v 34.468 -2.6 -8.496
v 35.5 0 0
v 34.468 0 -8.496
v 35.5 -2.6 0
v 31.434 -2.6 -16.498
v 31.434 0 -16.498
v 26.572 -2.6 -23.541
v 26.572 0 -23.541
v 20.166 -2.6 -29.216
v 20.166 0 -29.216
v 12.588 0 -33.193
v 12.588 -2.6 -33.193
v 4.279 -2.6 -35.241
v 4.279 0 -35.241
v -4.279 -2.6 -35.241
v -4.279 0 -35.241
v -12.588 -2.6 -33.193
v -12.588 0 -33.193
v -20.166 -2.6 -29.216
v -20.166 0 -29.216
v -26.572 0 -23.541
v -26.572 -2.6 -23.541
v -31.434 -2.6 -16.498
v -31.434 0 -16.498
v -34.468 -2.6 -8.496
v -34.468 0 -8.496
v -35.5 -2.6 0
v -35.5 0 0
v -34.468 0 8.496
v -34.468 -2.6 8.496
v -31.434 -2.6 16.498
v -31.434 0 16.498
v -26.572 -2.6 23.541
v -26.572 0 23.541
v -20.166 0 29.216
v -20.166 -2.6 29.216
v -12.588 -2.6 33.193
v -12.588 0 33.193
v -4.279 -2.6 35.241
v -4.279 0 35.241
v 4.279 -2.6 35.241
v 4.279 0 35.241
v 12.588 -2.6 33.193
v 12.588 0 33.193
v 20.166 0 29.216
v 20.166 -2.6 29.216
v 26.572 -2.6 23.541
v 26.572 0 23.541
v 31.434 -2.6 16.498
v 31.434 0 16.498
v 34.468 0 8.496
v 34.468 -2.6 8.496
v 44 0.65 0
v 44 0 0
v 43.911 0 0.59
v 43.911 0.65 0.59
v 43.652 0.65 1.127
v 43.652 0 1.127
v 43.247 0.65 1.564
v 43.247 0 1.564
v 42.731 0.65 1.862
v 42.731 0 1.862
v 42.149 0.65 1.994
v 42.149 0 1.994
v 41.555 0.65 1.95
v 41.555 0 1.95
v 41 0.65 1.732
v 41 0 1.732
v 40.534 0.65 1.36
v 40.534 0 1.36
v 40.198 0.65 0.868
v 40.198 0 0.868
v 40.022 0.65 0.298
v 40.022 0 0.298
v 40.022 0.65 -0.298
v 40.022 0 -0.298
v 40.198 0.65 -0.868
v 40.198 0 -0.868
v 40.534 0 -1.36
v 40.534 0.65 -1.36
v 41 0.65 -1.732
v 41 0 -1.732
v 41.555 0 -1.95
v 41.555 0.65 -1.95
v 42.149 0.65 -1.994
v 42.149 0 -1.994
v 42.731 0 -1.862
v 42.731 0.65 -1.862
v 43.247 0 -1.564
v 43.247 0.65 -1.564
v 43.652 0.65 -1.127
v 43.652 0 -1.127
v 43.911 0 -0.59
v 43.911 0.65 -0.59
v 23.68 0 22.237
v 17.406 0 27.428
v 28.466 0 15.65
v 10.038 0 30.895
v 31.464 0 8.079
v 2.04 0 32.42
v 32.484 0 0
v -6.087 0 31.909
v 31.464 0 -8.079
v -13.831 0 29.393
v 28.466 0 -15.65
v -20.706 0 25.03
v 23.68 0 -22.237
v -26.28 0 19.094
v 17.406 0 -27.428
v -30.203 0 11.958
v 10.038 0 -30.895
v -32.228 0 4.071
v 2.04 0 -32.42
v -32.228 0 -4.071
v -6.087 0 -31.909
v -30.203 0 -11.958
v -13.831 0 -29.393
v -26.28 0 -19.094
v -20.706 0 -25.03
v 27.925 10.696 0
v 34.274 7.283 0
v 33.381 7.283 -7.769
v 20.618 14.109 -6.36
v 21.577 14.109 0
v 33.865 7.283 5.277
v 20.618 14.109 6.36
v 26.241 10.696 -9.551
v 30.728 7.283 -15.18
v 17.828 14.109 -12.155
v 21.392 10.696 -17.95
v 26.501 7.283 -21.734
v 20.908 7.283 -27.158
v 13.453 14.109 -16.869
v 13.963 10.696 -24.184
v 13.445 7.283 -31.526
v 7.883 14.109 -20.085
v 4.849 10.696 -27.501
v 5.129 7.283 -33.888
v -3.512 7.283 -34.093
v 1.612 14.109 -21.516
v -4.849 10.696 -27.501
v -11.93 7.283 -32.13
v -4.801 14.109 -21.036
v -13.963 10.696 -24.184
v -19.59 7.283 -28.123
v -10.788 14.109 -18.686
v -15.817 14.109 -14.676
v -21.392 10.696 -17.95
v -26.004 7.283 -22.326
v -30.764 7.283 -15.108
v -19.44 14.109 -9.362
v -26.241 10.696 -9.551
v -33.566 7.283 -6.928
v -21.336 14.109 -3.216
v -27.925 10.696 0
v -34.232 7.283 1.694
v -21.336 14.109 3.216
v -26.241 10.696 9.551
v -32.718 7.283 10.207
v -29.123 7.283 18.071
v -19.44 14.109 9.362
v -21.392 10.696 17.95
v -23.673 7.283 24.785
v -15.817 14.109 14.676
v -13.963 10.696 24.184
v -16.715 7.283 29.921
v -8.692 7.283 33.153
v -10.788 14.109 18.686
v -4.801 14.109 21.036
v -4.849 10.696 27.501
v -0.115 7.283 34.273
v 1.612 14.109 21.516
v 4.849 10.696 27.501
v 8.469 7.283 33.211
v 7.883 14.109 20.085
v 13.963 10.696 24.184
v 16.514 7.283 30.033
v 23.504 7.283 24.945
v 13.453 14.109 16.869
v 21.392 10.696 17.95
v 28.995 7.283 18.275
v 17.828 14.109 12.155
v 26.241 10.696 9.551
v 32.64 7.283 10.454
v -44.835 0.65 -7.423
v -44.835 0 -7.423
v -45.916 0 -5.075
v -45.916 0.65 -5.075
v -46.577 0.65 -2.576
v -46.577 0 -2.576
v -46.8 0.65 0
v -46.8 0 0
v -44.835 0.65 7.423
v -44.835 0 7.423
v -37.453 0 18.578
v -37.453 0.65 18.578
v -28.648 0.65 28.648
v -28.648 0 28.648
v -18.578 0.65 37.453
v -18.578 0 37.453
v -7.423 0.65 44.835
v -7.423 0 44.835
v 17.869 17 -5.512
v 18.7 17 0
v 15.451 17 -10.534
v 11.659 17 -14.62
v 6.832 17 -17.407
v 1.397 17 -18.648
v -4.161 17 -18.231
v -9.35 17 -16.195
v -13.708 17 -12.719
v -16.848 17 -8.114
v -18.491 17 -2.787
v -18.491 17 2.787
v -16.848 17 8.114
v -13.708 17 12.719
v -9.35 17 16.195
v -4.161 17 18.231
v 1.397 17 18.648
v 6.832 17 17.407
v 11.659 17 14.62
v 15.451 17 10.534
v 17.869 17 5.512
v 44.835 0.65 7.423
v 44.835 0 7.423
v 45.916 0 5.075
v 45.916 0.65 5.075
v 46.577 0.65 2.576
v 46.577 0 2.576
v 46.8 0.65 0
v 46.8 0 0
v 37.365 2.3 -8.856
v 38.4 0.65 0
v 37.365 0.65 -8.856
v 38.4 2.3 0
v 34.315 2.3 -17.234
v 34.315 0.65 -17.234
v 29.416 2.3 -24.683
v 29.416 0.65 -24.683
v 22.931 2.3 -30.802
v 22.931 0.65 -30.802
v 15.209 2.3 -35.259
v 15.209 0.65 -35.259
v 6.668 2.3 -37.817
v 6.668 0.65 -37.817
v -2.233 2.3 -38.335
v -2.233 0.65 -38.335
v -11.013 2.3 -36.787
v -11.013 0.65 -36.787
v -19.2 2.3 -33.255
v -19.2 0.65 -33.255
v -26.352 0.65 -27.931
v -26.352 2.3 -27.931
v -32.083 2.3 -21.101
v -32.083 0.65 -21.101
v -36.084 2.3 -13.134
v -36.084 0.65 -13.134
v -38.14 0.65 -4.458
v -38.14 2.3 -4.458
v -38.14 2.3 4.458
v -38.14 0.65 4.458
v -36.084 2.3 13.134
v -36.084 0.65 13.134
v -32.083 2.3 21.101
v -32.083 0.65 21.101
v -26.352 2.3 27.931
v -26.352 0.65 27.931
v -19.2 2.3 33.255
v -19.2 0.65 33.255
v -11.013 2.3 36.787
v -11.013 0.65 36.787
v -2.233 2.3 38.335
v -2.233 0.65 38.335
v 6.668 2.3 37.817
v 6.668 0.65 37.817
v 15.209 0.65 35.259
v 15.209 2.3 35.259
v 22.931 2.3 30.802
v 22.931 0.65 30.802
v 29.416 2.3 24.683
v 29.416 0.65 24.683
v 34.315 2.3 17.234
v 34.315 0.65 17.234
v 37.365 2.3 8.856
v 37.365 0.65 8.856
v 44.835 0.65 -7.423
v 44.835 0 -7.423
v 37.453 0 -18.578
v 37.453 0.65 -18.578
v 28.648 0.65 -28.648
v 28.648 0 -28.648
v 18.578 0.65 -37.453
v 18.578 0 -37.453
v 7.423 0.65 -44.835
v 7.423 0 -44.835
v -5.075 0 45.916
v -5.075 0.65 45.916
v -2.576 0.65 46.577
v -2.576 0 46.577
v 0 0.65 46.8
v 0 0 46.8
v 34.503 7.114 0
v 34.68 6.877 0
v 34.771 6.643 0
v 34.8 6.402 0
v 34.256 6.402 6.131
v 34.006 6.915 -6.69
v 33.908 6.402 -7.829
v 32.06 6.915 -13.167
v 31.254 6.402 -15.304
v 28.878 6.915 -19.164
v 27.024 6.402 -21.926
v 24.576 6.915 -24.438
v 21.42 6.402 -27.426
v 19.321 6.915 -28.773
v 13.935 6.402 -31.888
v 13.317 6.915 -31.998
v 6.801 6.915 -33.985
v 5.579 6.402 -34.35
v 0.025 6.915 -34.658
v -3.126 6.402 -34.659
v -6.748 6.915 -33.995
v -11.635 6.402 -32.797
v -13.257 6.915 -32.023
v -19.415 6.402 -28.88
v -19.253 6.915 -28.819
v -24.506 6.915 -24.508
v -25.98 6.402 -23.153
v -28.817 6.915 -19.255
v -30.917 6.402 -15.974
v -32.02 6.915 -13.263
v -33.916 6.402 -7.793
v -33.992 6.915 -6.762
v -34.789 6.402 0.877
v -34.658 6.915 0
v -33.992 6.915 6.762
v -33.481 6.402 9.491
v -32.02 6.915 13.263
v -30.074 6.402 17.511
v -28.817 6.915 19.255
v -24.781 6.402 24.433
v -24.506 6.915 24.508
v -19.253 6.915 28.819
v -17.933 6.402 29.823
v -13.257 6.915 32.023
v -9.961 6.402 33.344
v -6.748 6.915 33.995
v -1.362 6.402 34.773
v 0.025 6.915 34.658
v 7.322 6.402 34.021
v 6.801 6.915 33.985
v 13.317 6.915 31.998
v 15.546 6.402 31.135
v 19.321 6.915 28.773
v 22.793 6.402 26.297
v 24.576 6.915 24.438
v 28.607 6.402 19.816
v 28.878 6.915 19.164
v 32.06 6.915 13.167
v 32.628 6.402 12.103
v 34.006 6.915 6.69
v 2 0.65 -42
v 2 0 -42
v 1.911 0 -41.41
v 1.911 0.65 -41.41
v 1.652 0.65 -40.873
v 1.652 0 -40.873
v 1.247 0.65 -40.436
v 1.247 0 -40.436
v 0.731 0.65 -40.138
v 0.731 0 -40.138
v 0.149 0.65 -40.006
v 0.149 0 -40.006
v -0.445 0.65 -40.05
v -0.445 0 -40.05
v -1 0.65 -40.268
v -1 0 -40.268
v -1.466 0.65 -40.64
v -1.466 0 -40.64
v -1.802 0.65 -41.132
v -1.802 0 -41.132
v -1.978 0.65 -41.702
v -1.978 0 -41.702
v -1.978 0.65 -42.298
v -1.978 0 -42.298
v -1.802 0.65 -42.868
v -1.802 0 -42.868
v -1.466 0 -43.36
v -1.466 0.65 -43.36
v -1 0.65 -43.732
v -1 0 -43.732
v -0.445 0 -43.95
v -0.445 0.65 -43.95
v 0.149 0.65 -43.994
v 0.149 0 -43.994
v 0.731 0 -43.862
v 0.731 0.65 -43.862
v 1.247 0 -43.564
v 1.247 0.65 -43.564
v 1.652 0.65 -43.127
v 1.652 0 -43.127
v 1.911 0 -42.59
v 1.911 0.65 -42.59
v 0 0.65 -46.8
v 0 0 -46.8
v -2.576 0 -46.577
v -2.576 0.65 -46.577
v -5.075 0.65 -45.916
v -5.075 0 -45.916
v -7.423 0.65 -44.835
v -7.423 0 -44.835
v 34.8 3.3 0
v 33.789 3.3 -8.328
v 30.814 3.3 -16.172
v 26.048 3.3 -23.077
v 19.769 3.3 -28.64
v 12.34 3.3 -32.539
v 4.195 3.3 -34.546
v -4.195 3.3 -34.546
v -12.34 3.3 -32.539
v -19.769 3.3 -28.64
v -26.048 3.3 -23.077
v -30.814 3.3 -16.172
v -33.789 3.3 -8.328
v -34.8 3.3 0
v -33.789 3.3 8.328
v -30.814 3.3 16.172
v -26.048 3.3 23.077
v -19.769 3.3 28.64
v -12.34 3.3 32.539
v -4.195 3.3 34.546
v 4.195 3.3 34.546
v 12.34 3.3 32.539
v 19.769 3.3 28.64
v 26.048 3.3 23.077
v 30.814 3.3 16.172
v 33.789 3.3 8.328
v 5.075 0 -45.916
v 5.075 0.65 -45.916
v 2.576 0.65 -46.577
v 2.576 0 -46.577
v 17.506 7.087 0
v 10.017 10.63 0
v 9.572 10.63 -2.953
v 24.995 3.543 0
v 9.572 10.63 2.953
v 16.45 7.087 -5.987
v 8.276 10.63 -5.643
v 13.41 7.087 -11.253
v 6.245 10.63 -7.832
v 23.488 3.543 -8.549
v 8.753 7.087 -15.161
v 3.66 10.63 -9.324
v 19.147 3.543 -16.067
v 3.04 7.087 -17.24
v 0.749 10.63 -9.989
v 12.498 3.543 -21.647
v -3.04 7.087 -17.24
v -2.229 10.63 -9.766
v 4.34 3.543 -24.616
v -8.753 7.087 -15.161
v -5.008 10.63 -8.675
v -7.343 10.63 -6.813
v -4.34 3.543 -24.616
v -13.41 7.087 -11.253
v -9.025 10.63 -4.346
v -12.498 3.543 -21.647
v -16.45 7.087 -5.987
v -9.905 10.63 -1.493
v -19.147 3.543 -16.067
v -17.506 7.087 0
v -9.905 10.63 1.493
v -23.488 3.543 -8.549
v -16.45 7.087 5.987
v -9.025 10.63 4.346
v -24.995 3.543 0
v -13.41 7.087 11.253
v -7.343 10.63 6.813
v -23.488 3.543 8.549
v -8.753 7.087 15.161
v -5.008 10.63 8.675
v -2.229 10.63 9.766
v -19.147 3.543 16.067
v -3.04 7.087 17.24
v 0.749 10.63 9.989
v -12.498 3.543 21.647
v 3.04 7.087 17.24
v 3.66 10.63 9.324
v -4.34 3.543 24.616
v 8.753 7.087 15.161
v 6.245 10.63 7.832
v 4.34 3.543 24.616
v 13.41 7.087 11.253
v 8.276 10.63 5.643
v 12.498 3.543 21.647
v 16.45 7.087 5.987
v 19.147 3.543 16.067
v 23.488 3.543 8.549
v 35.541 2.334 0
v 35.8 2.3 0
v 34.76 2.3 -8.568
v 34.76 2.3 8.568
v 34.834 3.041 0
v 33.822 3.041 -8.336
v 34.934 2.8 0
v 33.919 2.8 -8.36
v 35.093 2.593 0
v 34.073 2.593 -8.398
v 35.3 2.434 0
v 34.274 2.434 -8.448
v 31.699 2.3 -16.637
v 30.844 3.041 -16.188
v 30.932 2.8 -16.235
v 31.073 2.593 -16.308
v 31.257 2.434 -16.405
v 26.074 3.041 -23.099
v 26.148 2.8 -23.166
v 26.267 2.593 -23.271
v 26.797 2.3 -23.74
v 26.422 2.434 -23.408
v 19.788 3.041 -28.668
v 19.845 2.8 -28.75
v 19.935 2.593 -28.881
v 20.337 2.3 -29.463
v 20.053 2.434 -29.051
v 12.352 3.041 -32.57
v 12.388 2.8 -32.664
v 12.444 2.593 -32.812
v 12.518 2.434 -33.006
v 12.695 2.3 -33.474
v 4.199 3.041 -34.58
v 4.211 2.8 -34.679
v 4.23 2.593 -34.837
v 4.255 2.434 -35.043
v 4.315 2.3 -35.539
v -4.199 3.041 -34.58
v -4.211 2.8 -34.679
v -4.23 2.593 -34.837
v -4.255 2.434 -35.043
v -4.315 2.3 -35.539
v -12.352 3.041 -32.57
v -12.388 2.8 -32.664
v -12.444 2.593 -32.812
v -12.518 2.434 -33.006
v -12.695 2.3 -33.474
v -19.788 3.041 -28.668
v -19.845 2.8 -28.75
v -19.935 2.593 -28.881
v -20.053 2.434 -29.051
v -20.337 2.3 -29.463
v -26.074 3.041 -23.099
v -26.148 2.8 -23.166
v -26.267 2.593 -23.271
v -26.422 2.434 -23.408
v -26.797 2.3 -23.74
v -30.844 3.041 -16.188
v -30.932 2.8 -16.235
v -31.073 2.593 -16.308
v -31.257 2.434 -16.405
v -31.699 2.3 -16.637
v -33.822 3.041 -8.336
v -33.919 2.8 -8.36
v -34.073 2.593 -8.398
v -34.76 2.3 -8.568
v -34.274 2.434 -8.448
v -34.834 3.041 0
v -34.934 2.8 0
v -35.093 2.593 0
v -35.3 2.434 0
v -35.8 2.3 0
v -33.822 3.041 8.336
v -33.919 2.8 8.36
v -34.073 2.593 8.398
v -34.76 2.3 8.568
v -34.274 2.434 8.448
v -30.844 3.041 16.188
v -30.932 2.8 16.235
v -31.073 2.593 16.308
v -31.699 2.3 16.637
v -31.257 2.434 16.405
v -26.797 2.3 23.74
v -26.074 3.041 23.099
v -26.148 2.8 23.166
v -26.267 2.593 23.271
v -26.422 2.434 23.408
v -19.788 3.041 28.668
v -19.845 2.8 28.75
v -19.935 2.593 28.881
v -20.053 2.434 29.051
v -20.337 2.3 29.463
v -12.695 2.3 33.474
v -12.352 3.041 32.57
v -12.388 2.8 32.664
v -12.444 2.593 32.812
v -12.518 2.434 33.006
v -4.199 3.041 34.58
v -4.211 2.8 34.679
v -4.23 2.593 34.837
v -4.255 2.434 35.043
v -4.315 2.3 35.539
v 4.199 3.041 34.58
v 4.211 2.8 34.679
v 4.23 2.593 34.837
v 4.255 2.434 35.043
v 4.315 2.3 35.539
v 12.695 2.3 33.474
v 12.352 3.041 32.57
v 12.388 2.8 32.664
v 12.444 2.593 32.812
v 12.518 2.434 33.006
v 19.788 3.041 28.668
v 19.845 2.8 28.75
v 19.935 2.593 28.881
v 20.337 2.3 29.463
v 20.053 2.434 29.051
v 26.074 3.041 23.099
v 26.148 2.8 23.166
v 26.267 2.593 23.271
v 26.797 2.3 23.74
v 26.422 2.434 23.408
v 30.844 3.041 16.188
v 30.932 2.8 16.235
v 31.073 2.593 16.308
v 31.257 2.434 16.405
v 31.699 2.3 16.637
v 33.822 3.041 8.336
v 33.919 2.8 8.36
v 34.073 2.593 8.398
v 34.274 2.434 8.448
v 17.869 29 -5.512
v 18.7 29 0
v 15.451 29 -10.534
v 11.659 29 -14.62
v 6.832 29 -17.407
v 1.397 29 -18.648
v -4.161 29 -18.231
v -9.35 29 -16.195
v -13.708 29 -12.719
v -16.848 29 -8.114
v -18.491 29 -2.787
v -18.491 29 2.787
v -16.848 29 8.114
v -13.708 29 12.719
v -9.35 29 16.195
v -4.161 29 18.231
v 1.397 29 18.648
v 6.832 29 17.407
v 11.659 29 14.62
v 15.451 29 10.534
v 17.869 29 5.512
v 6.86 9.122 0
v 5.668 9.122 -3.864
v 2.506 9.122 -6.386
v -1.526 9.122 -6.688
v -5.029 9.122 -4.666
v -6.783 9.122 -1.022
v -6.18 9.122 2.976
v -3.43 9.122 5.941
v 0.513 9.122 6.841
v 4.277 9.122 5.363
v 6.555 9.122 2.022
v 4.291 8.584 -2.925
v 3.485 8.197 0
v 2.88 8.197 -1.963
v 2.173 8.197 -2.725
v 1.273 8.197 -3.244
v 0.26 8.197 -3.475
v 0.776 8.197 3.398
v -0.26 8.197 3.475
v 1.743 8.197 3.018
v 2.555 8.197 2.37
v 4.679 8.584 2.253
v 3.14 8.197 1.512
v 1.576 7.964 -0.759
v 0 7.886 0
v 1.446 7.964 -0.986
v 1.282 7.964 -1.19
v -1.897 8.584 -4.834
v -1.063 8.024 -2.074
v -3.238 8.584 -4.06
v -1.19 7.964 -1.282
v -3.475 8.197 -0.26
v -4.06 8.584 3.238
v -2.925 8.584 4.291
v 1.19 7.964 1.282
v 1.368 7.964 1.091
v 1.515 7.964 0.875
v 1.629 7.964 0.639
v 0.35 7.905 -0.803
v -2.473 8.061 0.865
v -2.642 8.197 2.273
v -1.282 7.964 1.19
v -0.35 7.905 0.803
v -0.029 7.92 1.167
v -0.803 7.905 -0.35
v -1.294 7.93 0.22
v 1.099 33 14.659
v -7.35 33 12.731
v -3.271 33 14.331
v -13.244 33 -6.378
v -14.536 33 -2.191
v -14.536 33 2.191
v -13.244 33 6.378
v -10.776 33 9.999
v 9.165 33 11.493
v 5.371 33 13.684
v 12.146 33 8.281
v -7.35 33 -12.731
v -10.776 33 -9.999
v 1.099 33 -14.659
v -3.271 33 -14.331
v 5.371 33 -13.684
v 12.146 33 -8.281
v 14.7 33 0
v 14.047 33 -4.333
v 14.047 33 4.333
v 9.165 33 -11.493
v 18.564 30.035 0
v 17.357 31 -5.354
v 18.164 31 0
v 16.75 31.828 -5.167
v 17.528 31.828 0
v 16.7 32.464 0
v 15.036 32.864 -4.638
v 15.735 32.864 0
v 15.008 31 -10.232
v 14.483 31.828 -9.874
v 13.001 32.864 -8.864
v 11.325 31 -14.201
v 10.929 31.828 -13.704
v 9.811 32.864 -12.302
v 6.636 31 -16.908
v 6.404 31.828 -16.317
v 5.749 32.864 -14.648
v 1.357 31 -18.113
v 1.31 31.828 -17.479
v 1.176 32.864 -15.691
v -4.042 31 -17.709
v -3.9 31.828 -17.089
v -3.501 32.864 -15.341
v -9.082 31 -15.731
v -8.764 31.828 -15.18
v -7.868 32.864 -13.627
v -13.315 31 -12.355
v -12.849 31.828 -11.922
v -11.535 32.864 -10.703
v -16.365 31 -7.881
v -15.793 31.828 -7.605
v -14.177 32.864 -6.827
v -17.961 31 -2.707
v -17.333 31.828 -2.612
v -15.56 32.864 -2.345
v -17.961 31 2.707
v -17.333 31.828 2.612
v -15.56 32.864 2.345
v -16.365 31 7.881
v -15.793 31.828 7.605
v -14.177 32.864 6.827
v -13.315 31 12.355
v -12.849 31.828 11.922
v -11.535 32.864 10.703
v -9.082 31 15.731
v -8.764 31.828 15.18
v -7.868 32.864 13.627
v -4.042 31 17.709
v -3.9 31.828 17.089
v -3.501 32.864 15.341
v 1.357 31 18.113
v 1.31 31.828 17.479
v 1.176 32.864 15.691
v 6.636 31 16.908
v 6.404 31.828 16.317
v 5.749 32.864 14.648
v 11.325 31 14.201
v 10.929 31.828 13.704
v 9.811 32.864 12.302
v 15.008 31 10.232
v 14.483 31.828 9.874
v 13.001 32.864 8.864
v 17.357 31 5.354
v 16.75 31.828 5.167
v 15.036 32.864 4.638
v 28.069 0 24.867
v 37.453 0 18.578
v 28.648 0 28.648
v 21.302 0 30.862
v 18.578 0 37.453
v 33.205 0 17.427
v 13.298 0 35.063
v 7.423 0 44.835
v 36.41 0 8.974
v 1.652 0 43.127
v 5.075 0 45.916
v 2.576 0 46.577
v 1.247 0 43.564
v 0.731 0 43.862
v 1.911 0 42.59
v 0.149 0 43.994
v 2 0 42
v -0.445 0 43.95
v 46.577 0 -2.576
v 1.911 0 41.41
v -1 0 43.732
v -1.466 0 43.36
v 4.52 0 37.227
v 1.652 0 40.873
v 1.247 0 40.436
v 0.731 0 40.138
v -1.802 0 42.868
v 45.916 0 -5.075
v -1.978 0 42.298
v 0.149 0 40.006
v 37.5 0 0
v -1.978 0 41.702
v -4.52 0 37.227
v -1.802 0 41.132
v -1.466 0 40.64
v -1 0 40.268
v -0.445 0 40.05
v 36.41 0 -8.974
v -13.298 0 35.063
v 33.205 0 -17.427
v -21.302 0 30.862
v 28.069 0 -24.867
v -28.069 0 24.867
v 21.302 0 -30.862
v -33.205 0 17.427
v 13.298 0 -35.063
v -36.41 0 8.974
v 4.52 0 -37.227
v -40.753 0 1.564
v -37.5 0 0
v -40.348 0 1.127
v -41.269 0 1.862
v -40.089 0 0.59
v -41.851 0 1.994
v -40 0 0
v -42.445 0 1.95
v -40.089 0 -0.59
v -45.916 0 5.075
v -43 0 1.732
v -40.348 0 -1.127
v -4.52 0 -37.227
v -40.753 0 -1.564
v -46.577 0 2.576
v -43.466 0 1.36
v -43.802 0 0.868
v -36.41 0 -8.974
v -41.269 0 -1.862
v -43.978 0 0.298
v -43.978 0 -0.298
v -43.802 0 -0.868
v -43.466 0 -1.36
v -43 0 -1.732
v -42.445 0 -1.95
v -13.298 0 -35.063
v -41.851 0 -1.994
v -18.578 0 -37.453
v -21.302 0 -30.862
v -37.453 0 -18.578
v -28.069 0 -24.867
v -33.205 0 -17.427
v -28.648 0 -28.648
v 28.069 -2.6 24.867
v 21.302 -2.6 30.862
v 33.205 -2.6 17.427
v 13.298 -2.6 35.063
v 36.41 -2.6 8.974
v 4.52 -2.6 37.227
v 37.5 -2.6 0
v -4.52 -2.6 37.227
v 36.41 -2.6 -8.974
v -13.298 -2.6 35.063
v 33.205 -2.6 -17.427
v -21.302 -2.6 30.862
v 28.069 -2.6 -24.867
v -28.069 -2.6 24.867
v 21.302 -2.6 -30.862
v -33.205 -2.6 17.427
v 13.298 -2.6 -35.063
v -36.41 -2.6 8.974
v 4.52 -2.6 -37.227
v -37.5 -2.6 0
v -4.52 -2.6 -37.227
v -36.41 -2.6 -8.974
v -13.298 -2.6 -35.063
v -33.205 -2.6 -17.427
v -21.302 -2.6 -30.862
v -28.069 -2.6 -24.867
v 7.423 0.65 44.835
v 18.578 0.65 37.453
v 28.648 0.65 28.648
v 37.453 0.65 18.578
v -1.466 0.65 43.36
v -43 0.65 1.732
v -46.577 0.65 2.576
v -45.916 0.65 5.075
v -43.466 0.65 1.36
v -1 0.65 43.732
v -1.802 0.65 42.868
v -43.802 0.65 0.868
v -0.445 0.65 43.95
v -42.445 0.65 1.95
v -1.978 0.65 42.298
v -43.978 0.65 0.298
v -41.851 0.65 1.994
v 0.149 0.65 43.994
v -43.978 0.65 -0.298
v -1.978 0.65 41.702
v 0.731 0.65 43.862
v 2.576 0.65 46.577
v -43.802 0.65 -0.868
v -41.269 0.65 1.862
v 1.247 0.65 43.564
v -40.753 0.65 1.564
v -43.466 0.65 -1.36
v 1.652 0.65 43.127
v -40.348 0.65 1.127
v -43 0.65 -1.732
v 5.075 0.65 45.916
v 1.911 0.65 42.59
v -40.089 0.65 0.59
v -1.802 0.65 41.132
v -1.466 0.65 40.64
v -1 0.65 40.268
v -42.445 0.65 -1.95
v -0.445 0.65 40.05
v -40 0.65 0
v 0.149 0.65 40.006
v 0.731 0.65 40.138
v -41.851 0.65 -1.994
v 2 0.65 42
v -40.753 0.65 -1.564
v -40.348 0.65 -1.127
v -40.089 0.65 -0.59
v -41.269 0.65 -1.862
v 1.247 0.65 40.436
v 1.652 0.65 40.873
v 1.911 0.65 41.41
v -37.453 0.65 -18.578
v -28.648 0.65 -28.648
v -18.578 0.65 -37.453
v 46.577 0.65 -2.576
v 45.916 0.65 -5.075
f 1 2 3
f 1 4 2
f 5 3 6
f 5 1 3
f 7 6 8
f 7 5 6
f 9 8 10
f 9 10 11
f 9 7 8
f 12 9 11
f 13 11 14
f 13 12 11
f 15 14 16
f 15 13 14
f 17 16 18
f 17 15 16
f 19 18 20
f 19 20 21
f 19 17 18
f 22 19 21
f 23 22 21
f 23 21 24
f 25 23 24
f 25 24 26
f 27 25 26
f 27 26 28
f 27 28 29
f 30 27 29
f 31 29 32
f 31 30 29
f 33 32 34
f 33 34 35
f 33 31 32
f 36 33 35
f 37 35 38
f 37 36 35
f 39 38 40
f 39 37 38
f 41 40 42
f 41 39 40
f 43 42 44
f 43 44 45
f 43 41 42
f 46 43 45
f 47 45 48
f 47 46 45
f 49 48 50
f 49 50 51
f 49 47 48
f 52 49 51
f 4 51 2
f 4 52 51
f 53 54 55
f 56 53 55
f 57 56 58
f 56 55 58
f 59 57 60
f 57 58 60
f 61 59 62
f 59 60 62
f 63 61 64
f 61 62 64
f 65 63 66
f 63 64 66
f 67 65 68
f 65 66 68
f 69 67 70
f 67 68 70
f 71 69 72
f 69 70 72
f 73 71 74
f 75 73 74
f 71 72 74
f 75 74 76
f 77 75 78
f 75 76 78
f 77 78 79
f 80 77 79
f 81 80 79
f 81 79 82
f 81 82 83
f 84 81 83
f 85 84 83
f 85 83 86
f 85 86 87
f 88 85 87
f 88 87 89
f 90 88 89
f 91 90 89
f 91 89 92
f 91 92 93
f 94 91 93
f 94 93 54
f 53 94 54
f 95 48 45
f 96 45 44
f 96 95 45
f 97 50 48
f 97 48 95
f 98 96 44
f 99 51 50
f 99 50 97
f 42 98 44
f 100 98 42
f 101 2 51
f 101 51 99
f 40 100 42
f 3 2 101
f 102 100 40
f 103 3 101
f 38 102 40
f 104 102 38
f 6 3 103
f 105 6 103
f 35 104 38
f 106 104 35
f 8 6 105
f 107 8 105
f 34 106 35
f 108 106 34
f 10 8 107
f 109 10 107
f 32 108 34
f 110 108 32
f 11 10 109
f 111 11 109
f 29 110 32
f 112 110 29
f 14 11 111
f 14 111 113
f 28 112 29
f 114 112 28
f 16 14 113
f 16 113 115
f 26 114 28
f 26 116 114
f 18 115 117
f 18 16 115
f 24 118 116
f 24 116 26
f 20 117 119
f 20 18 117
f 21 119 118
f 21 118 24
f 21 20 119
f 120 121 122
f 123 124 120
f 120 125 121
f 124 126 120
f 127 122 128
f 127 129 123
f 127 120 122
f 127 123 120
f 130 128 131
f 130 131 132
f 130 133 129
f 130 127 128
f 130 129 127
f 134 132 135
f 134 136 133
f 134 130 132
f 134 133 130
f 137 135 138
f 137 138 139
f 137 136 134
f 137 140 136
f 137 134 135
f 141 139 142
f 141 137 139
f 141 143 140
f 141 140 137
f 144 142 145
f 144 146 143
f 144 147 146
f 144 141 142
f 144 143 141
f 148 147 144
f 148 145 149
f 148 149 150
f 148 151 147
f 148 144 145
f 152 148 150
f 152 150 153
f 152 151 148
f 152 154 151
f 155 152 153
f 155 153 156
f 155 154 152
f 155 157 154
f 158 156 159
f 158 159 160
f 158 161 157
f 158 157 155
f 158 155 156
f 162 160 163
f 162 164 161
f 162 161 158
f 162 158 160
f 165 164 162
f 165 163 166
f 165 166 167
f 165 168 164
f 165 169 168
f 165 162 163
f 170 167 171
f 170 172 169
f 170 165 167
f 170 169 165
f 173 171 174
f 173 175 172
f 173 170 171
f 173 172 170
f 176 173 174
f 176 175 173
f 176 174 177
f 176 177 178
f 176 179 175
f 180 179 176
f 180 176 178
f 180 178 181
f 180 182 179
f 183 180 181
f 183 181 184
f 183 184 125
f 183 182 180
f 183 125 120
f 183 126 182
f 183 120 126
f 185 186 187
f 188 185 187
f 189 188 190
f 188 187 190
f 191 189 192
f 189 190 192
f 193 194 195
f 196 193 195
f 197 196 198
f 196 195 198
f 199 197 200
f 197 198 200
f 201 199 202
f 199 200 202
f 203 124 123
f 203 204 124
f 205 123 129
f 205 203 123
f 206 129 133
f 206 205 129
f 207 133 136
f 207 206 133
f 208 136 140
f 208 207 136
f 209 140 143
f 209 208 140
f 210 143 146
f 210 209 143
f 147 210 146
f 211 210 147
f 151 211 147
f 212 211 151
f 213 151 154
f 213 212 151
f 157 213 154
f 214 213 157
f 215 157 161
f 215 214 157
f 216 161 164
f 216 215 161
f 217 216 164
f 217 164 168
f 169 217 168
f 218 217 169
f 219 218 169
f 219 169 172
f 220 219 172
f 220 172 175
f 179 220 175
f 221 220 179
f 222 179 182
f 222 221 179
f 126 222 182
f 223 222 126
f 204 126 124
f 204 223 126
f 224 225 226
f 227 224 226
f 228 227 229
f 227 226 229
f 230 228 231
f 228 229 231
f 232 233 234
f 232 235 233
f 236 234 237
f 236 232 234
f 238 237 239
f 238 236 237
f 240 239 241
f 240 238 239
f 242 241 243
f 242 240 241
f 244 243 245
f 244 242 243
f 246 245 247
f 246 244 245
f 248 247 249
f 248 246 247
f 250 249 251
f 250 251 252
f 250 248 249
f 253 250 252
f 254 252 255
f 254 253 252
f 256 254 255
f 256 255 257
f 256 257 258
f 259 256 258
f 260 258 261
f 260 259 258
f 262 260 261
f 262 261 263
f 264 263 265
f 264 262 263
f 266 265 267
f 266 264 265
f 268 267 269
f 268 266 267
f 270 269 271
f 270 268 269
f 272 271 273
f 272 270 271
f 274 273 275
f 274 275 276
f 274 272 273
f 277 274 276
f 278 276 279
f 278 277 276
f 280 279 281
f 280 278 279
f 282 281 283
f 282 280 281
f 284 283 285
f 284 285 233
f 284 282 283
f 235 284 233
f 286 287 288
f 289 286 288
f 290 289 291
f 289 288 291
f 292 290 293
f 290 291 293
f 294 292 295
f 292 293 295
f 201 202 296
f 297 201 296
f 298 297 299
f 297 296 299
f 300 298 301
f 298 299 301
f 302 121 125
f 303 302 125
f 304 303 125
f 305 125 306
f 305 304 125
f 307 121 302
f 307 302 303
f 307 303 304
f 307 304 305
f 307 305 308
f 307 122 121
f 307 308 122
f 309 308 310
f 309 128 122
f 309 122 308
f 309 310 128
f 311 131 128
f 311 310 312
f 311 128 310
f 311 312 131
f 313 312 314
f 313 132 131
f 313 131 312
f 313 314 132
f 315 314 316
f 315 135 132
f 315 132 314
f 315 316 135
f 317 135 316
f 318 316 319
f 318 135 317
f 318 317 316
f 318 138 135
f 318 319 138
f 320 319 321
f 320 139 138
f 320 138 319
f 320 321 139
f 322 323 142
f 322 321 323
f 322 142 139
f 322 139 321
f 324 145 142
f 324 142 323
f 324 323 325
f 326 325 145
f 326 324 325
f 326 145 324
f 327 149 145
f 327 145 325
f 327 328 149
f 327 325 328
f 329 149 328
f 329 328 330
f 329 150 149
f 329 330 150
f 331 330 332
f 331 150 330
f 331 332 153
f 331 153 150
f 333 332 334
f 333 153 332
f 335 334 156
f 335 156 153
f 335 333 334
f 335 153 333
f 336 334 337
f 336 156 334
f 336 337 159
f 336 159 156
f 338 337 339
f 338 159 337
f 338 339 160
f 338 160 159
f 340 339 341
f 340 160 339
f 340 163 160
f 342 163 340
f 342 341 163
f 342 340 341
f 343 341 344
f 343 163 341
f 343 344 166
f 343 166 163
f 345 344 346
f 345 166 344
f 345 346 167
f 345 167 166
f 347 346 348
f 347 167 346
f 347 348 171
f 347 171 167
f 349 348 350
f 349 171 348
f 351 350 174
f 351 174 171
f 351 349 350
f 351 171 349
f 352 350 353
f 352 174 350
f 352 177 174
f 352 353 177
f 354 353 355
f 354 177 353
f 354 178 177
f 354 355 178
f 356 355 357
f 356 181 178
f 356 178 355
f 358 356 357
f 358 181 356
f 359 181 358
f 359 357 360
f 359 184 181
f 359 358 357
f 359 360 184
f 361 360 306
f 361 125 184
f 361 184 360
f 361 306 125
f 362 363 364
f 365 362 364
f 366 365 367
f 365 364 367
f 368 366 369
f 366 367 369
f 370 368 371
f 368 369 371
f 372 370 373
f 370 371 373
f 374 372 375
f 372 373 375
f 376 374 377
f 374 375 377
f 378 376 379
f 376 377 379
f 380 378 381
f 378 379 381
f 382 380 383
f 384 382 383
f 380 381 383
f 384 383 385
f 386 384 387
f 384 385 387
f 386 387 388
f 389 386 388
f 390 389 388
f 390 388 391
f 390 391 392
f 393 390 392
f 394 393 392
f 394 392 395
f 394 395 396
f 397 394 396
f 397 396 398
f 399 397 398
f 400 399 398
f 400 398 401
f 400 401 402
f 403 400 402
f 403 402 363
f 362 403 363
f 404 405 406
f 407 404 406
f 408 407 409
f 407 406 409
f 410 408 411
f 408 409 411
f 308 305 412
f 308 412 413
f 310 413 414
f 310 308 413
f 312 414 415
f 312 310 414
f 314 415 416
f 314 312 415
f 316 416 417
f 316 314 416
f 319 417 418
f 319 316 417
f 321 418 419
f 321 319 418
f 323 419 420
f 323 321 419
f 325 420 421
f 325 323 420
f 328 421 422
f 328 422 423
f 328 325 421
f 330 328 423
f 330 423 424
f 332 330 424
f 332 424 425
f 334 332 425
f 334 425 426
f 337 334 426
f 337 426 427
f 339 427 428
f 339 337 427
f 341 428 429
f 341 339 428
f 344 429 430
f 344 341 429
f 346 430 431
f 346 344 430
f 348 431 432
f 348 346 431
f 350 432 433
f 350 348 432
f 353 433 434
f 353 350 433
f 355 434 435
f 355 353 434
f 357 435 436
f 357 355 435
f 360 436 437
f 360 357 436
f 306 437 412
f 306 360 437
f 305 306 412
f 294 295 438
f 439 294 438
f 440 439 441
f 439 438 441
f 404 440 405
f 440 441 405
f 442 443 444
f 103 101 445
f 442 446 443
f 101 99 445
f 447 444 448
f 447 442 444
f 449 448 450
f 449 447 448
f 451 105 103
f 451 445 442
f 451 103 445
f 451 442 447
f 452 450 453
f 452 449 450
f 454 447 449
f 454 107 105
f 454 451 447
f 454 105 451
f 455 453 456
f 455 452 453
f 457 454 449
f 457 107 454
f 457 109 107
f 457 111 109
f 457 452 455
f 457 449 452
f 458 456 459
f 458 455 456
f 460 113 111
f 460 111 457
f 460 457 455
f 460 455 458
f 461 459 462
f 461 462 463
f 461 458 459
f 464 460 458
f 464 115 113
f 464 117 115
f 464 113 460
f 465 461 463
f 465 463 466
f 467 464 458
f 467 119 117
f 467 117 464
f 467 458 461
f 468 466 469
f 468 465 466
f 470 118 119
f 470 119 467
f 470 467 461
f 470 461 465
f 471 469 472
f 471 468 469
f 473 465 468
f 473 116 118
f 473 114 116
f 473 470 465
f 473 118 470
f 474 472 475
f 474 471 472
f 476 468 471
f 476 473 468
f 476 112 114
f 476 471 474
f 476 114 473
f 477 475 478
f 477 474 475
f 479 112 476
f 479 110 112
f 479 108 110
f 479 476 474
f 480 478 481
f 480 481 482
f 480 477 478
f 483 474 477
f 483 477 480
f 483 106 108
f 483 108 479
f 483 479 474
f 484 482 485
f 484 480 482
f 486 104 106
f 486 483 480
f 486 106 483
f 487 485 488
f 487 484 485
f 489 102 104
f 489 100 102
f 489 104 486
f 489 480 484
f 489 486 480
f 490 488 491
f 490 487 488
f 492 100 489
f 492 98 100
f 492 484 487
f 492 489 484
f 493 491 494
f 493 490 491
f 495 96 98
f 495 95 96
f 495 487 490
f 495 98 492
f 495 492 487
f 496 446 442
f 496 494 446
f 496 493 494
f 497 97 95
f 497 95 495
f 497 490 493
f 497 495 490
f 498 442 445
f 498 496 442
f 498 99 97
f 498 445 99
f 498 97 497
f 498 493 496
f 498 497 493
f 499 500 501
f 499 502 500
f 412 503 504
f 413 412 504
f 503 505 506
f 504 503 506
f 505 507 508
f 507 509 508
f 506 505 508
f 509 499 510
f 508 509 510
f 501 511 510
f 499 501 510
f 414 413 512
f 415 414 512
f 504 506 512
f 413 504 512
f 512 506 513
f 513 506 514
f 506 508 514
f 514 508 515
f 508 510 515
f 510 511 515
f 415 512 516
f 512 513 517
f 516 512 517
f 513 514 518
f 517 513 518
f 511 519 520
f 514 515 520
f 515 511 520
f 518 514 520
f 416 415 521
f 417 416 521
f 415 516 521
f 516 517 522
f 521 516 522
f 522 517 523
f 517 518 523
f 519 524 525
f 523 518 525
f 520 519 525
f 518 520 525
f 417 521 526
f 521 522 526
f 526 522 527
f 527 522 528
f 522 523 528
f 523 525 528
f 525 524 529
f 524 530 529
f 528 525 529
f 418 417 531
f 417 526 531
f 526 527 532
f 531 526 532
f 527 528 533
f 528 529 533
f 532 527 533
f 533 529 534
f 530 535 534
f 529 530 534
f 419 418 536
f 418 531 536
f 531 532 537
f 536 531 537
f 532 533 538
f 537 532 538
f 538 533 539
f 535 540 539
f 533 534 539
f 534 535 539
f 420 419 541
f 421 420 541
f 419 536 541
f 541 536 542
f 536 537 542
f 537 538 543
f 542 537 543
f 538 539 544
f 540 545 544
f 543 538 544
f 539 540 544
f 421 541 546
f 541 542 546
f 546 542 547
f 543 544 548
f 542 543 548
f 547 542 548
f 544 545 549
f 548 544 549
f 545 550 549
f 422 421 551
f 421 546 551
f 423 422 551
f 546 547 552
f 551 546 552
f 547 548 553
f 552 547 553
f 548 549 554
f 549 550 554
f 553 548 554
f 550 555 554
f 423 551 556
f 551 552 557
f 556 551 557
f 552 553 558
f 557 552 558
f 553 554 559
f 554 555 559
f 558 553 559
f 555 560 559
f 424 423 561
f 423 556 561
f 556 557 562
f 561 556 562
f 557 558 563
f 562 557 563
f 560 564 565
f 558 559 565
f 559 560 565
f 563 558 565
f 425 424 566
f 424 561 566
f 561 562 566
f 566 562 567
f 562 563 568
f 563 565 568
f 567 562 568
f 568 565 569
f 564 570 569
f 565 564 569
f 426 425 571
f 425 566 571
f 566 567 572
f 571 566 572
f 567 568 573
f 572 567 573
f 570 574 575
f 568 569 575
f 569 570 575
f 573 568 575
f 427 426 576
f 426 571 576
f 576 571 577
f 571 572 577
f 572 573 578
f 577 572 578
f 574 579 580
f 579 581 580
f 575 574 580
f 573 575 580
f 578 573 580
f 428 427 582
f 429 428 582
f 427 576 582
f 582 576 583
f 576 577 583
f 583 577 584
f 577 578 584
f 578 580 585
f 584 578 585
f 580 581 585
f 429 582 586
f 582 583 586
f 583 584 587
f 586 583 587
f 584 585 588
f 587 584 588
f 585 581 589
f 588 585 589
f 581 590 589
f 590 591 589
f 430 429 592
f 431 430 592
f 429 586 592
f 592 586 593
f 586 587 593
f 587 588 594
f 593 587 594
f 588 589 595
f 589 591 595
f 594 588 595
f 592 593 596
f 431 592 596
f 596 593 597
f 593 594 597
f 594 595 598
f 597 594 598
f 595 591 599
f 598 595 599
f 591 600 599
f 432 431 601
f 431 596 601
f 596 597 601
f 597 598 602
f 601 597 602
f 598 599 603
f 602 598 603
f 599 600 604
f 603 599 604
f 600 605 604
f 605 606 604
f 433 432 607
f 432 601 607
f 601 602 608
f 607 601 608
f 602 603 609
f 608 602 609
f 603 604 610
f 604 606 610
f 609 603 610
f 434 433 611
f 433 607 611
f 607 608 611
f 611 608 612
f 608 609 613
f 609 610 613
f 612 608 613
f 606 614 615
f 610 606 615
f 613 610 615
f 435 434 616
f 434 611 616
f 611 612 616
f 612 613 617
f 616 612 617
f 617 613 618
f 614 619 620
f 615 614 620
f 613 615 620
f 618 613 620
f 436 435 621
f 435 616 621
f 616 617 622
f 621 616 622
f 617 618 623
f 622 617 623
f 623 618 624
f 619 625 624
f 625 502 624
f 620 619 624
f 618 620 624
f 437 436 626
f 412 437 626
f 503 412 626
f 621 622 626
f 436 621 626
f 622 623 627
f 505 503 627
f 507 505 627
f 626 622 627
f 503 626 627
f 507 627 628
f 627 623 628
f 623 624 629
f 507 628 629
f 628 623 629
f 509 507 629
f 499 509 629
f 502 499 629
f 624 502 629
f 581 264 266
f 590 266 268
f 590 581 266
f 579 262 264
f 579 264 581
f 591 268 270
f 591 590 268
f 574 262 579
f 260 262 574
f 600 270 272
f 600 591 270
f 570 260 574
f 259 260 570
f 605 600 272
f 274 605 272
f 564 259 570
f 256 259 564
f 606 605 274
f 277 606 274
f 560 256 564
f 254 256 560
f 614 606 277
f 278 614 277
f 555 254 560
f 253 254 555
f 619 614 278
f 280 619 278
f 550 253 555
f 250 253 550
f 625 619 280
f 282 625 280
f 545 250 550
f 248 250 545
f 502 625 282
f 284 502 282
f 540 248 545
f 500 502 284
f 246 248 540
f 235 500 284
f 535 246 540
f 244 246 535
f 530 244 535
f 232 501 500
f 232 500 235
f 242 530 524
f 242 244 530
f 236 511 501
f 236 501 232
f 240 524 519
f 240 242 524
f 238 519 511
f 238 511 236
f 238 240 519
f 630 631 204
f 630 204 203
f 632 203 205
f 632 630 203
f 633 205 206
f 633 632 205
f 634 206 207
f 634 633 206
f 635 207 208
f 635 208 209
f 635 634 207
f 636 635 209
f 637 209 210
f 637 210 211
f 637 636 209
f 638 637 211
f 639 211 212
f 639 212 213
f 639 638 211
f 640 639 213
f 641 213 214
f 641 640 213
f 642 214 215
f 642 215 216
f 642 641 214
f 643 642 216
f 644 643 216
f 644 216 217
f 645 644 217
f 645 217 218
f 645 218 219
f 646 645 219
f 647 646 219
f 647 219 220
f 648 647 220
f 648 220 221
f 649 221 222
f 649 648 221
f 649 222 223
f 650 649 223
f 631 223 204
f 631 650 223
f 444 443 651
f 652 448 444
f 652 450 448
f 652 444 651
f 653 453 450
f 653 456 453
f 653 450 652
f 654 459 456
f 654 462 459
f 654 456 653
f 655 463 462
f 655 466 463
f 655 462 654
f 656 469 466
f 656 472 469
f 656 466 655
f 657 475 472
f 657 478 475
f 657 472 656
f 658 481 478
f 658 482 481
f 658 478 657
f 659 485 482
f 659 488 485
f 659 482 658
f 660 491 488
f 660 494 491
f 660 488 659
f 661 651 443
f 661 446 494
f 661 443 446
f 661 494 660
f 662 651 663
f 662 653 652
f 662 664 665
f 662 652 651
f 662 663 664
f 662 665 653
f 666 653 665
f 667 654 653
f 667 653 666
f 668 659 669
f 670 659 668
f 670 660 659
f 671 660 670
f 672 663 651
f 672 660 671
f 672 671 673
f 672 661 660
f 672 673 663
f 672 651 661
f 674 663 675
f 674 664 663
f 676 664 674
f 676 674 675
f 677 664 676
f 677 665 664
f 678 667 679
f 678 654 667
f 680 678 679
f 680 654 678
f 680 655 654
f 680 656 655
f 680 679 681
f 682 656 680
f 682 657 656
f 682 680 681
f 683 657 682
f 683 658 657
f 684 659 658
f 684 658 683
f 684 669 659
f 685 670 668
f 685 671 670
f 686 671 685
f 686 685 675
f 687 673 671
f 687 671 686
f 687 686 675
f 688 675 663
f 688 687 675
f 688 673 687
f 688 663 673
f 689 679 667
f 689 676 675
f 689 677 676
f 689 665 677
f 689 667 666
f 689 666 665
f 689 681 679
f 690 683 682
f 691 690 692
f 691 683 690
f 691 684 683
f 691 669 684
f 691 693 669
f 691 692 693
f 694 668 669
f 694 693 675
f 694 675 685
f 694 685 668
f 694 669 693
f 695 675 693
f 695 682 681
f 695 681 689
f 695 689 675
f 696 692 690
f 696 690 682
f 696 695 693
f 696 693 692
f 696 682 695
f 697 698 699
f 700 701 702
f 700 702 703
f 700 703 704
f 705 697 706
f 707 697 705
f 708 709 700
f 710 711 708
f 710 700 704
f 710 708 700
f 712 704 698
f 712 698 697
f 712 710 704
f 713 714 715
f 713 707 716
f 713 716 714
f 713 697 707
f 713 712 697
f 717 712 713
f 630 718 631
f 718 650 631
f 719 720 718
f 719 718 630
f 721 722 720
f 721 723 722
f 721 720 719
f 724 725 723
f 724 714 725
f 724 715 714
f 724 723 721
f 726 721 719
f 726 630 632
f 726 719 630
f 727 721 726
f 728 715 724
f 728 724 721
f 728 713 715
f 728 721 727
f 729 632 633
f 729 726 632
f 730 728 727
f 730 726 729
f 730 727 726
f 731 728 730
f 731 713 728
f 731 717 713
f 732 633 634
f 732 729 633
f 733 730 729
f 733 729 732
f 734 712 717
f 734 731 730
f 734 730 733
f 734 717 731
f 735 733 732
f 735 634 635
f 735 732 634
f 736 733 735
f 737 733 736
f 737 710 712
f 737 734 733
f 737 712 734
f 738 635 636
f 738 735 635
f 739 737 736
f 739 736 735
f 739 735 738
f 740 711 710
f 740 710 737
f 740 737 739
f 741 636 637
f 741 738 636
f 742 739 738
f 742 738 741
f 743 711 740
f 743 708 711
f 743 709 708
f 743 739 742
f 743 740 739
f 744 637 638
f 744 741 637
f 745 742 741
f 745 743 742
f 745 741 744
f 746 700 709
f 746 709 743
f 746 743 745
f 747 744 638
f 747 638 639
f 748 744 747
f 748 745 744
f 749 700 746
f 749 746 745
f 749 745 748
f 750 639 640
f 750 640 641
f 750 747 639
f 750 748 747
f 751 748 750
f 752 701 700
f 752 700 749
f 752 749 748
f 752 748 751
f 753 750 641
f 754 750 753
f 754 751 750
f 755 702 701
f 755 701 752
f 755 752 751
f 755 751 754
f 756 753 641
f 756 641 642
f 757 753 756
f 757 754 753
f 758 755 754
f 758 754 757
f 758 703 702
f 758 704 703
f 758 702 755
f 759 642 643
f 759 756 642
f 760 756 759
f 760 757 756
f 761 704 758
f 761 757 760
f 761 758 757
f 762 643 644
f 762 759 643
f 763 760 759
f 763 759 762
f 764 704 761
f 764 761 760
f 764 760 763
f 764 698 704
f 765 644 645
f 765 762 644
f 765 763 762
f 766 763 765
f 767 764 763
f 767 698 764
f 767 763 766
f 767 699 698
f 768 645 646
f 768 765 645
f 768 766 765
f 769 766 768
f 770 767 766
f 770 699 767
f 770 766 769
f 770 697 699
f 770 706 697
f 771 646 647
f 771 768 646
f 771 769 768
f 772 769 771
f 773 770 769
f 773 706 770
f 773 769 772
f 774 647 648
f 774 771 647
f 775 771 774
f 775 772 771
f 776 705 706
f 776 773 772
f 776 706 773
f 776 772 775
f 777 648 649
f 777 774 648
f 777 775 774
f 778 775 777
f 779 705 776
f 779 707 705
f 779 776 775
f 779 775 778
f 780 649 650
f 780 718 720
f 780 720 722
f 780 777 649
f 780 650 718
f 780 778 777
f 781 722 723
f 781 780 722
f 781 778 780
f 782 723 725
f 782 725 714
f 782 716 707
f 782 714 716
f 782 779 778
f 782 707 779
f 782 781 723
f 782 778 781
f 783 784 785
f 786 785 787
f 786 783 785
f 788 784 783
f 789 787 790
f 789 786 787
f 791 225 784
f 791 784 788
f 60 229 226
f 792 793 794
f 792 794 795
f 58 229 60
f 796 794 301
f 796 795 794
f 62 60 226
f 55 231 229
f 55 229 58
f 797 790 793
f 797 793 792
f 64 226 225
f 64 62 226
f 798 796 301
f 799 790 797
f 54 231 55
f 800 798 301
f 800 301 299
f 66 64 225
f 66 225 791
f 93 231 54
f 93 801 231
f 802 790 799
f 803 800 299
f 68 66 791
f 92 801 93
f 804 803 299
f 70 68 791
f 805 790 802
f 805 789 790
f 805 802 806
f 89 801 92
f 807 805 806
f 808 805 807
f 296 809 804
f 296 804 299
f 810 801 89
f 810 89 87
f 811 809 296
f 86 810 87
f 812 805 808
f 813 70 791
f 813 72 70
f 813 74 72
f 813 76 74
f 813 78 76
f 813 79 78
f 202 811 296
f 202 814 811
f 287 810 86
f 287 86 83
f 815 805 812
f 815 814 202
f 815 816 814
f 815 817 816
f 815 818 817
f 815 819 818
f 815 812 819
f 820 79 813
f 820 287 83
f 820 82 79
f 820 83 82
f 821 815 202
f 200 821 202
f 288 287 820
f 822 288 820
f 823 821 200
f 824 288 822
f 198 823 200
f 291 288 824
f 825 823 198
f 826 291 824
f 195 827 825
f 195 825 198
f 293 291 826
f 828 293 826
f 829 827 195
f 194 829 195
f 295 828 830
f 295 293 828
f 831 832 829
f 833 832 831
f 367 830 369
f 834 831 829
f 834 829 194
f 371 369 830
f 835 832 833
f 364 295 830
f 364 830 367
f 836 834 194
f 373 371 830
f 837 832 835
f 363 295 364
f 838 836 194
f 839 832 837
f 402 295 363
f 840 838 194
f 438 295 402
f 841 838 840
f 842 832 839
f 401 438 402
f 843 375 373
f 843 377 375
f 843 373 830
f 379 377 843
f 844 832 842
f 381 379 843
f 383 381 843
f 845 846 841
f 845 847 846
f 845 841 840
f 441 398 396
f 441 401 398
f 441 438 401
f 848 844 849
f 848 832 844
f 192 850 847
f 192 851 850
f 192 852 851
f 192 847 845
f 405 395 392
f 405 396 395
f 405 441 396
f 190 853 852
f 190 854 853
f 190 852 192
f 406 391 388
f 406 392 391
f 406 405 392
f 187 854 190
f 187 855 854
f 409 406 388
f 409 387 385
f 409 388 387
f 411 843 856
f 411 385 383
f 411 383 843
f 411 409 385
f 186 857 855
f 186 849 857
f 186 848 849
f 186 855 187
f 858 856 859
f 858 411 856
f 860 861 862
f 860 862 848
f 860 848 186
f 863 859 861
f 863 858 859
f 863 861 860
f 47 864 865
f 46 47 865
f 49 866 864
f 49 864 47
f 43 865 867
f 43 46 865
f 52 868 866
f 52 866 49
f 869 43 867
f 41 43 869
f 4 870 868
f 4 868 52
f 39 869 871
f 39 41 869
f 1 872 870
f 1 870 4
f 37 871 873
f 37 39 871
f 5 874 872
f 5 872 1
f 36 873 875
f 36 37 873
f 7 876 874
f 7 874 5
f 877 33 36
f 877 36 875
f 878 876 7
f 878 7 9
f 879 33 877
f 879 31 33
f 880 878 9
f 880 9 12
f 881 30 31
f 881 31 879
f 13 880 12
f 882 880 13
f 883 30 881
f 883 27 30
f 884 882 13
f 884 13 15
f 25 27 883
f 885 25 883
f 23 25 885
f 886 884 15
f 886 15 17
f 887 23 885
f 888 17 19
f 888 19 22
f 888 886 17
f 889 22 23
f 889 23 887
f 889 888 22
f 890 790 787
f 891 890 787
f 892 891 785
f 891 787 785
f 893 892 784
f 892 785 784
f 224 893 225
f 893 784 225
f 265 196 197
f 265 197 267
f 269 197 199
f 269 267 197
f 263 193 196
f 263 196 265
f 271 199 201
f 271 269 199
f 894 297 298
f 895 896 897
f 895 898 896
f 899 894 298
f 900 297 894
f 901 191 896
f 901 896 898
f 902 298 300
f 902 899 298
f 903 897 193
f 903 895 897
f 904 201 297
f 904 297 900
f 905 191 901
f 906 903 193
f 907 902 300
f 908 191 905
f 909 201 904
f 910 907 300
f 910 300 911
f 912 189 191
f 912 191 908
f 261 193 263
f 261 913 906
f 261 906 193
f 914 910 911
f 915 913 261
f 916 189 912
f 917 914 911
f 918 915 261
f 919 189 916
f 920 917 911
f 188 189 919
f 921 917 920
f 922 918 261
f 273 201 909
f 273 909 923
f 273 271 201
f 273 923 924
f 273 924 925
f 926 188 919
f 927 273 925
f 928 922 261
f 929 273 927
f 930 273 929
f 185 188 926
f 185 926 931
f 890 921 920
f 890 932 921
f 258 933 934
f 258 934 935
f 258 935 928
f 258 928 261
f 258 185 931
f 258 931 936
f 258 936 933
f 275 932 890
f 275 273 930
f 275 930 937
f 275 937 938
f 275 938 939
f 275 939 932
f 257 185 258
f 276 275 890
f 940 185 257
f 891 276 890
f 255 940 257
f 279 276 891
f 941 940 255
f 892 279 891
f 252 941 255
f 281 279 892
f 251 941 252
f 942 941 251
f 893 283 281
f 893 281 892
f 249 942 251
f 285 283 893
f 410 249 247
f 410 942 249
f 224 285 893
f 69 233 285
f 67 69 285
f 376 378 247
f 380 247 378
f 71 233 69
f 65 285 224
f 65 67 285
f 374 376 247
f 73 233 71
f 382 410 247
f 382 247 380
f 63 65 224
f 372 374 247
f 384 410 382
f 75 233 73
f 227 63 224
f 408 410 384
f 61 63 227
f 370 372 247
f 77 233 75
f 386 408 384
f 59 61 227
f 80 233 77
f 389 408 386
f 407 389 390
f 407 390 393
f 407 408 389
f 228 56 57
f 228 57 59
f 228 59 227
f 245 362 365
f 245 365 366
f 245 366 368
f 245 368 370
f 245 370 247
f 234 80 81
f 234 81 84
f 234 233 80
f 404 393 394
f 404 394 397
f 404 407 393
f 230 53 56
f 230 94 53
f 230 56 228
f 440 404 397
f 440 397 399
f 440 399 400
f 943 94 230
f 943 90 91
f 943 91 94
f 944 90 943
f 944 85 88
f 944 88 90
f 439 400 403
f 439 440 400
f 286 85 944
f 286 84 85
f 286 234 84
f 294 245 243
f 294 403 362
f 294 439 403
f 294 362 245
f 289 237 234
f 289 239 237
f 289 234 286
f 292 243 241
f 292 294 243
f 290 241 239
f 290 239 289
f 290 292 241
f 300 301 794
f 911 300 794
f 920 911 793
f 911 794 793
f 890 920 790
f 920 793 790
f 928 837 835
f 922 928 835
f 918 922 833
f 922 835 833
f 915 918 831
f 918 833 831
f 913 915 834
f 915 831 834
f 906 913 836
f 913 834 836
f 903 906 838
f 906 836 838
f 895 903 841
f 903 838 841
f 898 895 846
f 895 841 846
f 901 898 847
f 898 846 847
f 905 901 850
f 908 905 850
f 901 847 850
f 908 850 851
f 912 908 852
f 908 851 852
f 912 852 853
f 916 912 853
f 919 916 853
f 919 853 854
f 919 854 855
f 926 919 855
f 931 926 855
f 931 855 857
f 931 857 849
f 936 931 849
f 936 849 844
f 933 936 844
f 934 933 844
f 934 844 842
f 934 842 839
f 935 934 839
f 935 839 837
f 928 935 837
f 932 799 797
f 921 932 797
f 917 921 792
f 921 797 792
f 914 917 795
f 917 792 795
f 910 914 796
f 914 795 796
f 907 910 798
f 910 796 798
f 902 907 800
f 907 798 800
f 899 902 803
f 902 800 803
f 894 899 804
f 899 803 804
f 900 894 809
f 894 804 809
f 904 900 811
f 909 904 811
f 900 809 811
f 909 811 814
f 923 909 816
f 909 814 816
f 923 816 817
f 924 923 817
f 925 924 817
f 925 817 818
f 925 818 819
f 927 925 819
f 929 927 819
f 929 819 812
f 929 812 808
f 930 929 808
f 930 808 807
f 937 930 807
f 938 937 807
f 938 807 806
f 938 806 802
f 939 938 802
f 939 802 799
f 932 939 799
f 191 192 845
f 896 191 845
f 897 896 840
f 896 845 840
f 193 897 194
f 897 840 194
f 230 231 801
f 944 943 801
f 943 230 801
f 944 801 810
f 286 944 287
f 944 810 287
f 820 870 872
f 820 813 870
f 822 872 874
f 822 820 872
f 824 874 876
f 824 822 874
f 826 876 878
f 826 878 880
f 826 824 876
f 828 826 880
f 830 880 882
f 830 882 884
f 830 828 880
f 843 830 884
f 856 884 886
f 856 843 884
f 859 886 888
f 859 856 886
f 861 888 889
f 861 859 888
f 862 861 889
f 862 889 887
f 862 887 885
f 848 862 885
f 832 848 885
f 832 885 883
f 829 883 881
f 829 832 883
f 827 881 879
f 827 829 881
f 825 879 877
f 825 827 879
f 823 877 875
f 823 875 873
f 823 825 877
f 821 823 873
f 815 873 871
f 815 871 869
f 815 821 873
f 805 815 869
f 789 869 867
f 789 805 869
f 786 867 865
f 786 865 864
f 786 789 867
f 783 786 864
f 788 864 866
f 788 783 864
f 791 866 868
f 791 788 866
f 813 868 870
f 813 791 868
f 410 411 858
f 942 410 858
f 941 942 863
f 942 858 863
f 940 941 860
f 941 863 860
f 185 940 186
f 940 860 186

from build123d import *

# Parameters (mm, degrees)
F2_R     = 4
F3_R     = 1
F4_R     = 2
F5_DEPTH = 25


with BuildPart() as f1:
    # F0 (on Top) → F1 (revolve)
    with BuildSketch(Plane.XY):
        with BuildLine():
            Line((37.5, -2.6), (37.5, 0))
            Line((37.5, 0), (46.8, 0))
            Line((46.8, 0), (46.8, 0.65))
            Line((46.8, 0.65), (38.4, 0.65))
            Line((38.4, 0.65), (38.4, 2.3))
            Line((38.4, 2.3), (34.8, 2.3))
            Line((34.8, 2.3), (34.8, 7))
            Line((34.8, 7), (21.576792, 14.108865))
            Line((21.576792, 14.108865), (18.7, 17))
            Line((18.7, 17), (18.7, 33))
            Line((18.7, 33), (0, 33))
            Line((0, 33), (0, 7.885643))
            ThreePointArc((0, 7.885643), (5.193057, 8.584234), (10.016886, 10.630338))
            Line((10.016886, 10.630338), (32.484462, 0))
            Line((32.484462, 0), (35.5, 0))
            Line((35.5, 0), (35.5, -2.6))
            Line((35.5, -2.6), (37.5, -2.6))
        make_face()
    revolve(axis=Axis((0, 27.784977, 0), (0, 1, 0)))

    # F2
    f2_edges = [f1.edges().sort_by_distance(p)[0] for p in [
        (-18.7, 33, 0),
    ]]
    fillet(f2_edges, radius=F2_R)

    # F3
    f3_edges = [f1.edges().sort_by_distance(p)[0] for p in [
        (-34.8, 7, 0),
        (-34.8, 2.3, 0),
    ]]
    fillet(f3_edges, radius=F3_R)

    # F4 (on face) → F5 (cut)
    with BuildSketch(Plane.XZ):
        with BuildLine():
            ThreePointArc((0, -46.8), (33.092597, -33.092597), (46.8, 0))
            ThreePointArc((46.8, 0), (46.300332, -3.839319), (44.834617, -7.422853))
            ThreePointArc((44.834617, -7.422853), (28.647845, -28.647845), (7.422853, -44.834618))
            ThreePointArc((7.422853, -44.834618), (3.839319, -46.300332), (0, -46.8))
        make_face()
        with BuildLine():
            ThreePointArc((-44.834618, -7.422853), (-46.300332, -3.839319), (-46.8, 0))
            ThreePointArc((-46.8, 0), (-33.092597, -33.092597), (0, -46.8))
            ThreePointArc((0, -46.8), (-3.839319, -46.300332), (-7.422853, -44.834618))
            ThreePointArc((-7.422853, -44.834618), (-28.647845, -28.647845), (-44.834618, -7.422853))
        make_face()
        with BuildLine():
            ThreePointArc((-7.422852, 44.834618), (-3.839319, 46.300332), (0, 46.8))
            ThreePointArc((0, 46.8), (-33.092597, 33.092597), (-46.8, 0))
            ThreePointArc((-46.8, 0), (-46.300332, 3.839319), (-44.834618, 7.422853))
            ThreePointArc((-44.834618, 7.422853), (-28.647845, 28.647845), (-7.422852, 44.834618))
        make_face()
        with BuildLine():
            ThreePointArc((0, 46.8), (3.839319, 46.300332), (7.422853, 44.834618))
            ThreePointArc((7.422853, 44.834618), (28.647845, 28.647845), (44.834618, 7.422853))
            ThreePointArc((44.834618, 7.422853), (46.300332, 3.839319), (46.8, 0))
            ThreePointArc((46.8, 0), (33.092597, 33.092597), (0, 46.8))
        make_face()
        with Locations((0, -42)):
            Circle(F4_R)
        with Locations((0, 42)):
            Circle(F4_R)
        with Locations((-42, 0)):
            Circle(F4_R)
        with Locations((42, 0)):
            Circle(F4_R)
    extrude(amount=-F5_DEPTH, mode=Mode.SUBTRACT)


solid = f1.part
